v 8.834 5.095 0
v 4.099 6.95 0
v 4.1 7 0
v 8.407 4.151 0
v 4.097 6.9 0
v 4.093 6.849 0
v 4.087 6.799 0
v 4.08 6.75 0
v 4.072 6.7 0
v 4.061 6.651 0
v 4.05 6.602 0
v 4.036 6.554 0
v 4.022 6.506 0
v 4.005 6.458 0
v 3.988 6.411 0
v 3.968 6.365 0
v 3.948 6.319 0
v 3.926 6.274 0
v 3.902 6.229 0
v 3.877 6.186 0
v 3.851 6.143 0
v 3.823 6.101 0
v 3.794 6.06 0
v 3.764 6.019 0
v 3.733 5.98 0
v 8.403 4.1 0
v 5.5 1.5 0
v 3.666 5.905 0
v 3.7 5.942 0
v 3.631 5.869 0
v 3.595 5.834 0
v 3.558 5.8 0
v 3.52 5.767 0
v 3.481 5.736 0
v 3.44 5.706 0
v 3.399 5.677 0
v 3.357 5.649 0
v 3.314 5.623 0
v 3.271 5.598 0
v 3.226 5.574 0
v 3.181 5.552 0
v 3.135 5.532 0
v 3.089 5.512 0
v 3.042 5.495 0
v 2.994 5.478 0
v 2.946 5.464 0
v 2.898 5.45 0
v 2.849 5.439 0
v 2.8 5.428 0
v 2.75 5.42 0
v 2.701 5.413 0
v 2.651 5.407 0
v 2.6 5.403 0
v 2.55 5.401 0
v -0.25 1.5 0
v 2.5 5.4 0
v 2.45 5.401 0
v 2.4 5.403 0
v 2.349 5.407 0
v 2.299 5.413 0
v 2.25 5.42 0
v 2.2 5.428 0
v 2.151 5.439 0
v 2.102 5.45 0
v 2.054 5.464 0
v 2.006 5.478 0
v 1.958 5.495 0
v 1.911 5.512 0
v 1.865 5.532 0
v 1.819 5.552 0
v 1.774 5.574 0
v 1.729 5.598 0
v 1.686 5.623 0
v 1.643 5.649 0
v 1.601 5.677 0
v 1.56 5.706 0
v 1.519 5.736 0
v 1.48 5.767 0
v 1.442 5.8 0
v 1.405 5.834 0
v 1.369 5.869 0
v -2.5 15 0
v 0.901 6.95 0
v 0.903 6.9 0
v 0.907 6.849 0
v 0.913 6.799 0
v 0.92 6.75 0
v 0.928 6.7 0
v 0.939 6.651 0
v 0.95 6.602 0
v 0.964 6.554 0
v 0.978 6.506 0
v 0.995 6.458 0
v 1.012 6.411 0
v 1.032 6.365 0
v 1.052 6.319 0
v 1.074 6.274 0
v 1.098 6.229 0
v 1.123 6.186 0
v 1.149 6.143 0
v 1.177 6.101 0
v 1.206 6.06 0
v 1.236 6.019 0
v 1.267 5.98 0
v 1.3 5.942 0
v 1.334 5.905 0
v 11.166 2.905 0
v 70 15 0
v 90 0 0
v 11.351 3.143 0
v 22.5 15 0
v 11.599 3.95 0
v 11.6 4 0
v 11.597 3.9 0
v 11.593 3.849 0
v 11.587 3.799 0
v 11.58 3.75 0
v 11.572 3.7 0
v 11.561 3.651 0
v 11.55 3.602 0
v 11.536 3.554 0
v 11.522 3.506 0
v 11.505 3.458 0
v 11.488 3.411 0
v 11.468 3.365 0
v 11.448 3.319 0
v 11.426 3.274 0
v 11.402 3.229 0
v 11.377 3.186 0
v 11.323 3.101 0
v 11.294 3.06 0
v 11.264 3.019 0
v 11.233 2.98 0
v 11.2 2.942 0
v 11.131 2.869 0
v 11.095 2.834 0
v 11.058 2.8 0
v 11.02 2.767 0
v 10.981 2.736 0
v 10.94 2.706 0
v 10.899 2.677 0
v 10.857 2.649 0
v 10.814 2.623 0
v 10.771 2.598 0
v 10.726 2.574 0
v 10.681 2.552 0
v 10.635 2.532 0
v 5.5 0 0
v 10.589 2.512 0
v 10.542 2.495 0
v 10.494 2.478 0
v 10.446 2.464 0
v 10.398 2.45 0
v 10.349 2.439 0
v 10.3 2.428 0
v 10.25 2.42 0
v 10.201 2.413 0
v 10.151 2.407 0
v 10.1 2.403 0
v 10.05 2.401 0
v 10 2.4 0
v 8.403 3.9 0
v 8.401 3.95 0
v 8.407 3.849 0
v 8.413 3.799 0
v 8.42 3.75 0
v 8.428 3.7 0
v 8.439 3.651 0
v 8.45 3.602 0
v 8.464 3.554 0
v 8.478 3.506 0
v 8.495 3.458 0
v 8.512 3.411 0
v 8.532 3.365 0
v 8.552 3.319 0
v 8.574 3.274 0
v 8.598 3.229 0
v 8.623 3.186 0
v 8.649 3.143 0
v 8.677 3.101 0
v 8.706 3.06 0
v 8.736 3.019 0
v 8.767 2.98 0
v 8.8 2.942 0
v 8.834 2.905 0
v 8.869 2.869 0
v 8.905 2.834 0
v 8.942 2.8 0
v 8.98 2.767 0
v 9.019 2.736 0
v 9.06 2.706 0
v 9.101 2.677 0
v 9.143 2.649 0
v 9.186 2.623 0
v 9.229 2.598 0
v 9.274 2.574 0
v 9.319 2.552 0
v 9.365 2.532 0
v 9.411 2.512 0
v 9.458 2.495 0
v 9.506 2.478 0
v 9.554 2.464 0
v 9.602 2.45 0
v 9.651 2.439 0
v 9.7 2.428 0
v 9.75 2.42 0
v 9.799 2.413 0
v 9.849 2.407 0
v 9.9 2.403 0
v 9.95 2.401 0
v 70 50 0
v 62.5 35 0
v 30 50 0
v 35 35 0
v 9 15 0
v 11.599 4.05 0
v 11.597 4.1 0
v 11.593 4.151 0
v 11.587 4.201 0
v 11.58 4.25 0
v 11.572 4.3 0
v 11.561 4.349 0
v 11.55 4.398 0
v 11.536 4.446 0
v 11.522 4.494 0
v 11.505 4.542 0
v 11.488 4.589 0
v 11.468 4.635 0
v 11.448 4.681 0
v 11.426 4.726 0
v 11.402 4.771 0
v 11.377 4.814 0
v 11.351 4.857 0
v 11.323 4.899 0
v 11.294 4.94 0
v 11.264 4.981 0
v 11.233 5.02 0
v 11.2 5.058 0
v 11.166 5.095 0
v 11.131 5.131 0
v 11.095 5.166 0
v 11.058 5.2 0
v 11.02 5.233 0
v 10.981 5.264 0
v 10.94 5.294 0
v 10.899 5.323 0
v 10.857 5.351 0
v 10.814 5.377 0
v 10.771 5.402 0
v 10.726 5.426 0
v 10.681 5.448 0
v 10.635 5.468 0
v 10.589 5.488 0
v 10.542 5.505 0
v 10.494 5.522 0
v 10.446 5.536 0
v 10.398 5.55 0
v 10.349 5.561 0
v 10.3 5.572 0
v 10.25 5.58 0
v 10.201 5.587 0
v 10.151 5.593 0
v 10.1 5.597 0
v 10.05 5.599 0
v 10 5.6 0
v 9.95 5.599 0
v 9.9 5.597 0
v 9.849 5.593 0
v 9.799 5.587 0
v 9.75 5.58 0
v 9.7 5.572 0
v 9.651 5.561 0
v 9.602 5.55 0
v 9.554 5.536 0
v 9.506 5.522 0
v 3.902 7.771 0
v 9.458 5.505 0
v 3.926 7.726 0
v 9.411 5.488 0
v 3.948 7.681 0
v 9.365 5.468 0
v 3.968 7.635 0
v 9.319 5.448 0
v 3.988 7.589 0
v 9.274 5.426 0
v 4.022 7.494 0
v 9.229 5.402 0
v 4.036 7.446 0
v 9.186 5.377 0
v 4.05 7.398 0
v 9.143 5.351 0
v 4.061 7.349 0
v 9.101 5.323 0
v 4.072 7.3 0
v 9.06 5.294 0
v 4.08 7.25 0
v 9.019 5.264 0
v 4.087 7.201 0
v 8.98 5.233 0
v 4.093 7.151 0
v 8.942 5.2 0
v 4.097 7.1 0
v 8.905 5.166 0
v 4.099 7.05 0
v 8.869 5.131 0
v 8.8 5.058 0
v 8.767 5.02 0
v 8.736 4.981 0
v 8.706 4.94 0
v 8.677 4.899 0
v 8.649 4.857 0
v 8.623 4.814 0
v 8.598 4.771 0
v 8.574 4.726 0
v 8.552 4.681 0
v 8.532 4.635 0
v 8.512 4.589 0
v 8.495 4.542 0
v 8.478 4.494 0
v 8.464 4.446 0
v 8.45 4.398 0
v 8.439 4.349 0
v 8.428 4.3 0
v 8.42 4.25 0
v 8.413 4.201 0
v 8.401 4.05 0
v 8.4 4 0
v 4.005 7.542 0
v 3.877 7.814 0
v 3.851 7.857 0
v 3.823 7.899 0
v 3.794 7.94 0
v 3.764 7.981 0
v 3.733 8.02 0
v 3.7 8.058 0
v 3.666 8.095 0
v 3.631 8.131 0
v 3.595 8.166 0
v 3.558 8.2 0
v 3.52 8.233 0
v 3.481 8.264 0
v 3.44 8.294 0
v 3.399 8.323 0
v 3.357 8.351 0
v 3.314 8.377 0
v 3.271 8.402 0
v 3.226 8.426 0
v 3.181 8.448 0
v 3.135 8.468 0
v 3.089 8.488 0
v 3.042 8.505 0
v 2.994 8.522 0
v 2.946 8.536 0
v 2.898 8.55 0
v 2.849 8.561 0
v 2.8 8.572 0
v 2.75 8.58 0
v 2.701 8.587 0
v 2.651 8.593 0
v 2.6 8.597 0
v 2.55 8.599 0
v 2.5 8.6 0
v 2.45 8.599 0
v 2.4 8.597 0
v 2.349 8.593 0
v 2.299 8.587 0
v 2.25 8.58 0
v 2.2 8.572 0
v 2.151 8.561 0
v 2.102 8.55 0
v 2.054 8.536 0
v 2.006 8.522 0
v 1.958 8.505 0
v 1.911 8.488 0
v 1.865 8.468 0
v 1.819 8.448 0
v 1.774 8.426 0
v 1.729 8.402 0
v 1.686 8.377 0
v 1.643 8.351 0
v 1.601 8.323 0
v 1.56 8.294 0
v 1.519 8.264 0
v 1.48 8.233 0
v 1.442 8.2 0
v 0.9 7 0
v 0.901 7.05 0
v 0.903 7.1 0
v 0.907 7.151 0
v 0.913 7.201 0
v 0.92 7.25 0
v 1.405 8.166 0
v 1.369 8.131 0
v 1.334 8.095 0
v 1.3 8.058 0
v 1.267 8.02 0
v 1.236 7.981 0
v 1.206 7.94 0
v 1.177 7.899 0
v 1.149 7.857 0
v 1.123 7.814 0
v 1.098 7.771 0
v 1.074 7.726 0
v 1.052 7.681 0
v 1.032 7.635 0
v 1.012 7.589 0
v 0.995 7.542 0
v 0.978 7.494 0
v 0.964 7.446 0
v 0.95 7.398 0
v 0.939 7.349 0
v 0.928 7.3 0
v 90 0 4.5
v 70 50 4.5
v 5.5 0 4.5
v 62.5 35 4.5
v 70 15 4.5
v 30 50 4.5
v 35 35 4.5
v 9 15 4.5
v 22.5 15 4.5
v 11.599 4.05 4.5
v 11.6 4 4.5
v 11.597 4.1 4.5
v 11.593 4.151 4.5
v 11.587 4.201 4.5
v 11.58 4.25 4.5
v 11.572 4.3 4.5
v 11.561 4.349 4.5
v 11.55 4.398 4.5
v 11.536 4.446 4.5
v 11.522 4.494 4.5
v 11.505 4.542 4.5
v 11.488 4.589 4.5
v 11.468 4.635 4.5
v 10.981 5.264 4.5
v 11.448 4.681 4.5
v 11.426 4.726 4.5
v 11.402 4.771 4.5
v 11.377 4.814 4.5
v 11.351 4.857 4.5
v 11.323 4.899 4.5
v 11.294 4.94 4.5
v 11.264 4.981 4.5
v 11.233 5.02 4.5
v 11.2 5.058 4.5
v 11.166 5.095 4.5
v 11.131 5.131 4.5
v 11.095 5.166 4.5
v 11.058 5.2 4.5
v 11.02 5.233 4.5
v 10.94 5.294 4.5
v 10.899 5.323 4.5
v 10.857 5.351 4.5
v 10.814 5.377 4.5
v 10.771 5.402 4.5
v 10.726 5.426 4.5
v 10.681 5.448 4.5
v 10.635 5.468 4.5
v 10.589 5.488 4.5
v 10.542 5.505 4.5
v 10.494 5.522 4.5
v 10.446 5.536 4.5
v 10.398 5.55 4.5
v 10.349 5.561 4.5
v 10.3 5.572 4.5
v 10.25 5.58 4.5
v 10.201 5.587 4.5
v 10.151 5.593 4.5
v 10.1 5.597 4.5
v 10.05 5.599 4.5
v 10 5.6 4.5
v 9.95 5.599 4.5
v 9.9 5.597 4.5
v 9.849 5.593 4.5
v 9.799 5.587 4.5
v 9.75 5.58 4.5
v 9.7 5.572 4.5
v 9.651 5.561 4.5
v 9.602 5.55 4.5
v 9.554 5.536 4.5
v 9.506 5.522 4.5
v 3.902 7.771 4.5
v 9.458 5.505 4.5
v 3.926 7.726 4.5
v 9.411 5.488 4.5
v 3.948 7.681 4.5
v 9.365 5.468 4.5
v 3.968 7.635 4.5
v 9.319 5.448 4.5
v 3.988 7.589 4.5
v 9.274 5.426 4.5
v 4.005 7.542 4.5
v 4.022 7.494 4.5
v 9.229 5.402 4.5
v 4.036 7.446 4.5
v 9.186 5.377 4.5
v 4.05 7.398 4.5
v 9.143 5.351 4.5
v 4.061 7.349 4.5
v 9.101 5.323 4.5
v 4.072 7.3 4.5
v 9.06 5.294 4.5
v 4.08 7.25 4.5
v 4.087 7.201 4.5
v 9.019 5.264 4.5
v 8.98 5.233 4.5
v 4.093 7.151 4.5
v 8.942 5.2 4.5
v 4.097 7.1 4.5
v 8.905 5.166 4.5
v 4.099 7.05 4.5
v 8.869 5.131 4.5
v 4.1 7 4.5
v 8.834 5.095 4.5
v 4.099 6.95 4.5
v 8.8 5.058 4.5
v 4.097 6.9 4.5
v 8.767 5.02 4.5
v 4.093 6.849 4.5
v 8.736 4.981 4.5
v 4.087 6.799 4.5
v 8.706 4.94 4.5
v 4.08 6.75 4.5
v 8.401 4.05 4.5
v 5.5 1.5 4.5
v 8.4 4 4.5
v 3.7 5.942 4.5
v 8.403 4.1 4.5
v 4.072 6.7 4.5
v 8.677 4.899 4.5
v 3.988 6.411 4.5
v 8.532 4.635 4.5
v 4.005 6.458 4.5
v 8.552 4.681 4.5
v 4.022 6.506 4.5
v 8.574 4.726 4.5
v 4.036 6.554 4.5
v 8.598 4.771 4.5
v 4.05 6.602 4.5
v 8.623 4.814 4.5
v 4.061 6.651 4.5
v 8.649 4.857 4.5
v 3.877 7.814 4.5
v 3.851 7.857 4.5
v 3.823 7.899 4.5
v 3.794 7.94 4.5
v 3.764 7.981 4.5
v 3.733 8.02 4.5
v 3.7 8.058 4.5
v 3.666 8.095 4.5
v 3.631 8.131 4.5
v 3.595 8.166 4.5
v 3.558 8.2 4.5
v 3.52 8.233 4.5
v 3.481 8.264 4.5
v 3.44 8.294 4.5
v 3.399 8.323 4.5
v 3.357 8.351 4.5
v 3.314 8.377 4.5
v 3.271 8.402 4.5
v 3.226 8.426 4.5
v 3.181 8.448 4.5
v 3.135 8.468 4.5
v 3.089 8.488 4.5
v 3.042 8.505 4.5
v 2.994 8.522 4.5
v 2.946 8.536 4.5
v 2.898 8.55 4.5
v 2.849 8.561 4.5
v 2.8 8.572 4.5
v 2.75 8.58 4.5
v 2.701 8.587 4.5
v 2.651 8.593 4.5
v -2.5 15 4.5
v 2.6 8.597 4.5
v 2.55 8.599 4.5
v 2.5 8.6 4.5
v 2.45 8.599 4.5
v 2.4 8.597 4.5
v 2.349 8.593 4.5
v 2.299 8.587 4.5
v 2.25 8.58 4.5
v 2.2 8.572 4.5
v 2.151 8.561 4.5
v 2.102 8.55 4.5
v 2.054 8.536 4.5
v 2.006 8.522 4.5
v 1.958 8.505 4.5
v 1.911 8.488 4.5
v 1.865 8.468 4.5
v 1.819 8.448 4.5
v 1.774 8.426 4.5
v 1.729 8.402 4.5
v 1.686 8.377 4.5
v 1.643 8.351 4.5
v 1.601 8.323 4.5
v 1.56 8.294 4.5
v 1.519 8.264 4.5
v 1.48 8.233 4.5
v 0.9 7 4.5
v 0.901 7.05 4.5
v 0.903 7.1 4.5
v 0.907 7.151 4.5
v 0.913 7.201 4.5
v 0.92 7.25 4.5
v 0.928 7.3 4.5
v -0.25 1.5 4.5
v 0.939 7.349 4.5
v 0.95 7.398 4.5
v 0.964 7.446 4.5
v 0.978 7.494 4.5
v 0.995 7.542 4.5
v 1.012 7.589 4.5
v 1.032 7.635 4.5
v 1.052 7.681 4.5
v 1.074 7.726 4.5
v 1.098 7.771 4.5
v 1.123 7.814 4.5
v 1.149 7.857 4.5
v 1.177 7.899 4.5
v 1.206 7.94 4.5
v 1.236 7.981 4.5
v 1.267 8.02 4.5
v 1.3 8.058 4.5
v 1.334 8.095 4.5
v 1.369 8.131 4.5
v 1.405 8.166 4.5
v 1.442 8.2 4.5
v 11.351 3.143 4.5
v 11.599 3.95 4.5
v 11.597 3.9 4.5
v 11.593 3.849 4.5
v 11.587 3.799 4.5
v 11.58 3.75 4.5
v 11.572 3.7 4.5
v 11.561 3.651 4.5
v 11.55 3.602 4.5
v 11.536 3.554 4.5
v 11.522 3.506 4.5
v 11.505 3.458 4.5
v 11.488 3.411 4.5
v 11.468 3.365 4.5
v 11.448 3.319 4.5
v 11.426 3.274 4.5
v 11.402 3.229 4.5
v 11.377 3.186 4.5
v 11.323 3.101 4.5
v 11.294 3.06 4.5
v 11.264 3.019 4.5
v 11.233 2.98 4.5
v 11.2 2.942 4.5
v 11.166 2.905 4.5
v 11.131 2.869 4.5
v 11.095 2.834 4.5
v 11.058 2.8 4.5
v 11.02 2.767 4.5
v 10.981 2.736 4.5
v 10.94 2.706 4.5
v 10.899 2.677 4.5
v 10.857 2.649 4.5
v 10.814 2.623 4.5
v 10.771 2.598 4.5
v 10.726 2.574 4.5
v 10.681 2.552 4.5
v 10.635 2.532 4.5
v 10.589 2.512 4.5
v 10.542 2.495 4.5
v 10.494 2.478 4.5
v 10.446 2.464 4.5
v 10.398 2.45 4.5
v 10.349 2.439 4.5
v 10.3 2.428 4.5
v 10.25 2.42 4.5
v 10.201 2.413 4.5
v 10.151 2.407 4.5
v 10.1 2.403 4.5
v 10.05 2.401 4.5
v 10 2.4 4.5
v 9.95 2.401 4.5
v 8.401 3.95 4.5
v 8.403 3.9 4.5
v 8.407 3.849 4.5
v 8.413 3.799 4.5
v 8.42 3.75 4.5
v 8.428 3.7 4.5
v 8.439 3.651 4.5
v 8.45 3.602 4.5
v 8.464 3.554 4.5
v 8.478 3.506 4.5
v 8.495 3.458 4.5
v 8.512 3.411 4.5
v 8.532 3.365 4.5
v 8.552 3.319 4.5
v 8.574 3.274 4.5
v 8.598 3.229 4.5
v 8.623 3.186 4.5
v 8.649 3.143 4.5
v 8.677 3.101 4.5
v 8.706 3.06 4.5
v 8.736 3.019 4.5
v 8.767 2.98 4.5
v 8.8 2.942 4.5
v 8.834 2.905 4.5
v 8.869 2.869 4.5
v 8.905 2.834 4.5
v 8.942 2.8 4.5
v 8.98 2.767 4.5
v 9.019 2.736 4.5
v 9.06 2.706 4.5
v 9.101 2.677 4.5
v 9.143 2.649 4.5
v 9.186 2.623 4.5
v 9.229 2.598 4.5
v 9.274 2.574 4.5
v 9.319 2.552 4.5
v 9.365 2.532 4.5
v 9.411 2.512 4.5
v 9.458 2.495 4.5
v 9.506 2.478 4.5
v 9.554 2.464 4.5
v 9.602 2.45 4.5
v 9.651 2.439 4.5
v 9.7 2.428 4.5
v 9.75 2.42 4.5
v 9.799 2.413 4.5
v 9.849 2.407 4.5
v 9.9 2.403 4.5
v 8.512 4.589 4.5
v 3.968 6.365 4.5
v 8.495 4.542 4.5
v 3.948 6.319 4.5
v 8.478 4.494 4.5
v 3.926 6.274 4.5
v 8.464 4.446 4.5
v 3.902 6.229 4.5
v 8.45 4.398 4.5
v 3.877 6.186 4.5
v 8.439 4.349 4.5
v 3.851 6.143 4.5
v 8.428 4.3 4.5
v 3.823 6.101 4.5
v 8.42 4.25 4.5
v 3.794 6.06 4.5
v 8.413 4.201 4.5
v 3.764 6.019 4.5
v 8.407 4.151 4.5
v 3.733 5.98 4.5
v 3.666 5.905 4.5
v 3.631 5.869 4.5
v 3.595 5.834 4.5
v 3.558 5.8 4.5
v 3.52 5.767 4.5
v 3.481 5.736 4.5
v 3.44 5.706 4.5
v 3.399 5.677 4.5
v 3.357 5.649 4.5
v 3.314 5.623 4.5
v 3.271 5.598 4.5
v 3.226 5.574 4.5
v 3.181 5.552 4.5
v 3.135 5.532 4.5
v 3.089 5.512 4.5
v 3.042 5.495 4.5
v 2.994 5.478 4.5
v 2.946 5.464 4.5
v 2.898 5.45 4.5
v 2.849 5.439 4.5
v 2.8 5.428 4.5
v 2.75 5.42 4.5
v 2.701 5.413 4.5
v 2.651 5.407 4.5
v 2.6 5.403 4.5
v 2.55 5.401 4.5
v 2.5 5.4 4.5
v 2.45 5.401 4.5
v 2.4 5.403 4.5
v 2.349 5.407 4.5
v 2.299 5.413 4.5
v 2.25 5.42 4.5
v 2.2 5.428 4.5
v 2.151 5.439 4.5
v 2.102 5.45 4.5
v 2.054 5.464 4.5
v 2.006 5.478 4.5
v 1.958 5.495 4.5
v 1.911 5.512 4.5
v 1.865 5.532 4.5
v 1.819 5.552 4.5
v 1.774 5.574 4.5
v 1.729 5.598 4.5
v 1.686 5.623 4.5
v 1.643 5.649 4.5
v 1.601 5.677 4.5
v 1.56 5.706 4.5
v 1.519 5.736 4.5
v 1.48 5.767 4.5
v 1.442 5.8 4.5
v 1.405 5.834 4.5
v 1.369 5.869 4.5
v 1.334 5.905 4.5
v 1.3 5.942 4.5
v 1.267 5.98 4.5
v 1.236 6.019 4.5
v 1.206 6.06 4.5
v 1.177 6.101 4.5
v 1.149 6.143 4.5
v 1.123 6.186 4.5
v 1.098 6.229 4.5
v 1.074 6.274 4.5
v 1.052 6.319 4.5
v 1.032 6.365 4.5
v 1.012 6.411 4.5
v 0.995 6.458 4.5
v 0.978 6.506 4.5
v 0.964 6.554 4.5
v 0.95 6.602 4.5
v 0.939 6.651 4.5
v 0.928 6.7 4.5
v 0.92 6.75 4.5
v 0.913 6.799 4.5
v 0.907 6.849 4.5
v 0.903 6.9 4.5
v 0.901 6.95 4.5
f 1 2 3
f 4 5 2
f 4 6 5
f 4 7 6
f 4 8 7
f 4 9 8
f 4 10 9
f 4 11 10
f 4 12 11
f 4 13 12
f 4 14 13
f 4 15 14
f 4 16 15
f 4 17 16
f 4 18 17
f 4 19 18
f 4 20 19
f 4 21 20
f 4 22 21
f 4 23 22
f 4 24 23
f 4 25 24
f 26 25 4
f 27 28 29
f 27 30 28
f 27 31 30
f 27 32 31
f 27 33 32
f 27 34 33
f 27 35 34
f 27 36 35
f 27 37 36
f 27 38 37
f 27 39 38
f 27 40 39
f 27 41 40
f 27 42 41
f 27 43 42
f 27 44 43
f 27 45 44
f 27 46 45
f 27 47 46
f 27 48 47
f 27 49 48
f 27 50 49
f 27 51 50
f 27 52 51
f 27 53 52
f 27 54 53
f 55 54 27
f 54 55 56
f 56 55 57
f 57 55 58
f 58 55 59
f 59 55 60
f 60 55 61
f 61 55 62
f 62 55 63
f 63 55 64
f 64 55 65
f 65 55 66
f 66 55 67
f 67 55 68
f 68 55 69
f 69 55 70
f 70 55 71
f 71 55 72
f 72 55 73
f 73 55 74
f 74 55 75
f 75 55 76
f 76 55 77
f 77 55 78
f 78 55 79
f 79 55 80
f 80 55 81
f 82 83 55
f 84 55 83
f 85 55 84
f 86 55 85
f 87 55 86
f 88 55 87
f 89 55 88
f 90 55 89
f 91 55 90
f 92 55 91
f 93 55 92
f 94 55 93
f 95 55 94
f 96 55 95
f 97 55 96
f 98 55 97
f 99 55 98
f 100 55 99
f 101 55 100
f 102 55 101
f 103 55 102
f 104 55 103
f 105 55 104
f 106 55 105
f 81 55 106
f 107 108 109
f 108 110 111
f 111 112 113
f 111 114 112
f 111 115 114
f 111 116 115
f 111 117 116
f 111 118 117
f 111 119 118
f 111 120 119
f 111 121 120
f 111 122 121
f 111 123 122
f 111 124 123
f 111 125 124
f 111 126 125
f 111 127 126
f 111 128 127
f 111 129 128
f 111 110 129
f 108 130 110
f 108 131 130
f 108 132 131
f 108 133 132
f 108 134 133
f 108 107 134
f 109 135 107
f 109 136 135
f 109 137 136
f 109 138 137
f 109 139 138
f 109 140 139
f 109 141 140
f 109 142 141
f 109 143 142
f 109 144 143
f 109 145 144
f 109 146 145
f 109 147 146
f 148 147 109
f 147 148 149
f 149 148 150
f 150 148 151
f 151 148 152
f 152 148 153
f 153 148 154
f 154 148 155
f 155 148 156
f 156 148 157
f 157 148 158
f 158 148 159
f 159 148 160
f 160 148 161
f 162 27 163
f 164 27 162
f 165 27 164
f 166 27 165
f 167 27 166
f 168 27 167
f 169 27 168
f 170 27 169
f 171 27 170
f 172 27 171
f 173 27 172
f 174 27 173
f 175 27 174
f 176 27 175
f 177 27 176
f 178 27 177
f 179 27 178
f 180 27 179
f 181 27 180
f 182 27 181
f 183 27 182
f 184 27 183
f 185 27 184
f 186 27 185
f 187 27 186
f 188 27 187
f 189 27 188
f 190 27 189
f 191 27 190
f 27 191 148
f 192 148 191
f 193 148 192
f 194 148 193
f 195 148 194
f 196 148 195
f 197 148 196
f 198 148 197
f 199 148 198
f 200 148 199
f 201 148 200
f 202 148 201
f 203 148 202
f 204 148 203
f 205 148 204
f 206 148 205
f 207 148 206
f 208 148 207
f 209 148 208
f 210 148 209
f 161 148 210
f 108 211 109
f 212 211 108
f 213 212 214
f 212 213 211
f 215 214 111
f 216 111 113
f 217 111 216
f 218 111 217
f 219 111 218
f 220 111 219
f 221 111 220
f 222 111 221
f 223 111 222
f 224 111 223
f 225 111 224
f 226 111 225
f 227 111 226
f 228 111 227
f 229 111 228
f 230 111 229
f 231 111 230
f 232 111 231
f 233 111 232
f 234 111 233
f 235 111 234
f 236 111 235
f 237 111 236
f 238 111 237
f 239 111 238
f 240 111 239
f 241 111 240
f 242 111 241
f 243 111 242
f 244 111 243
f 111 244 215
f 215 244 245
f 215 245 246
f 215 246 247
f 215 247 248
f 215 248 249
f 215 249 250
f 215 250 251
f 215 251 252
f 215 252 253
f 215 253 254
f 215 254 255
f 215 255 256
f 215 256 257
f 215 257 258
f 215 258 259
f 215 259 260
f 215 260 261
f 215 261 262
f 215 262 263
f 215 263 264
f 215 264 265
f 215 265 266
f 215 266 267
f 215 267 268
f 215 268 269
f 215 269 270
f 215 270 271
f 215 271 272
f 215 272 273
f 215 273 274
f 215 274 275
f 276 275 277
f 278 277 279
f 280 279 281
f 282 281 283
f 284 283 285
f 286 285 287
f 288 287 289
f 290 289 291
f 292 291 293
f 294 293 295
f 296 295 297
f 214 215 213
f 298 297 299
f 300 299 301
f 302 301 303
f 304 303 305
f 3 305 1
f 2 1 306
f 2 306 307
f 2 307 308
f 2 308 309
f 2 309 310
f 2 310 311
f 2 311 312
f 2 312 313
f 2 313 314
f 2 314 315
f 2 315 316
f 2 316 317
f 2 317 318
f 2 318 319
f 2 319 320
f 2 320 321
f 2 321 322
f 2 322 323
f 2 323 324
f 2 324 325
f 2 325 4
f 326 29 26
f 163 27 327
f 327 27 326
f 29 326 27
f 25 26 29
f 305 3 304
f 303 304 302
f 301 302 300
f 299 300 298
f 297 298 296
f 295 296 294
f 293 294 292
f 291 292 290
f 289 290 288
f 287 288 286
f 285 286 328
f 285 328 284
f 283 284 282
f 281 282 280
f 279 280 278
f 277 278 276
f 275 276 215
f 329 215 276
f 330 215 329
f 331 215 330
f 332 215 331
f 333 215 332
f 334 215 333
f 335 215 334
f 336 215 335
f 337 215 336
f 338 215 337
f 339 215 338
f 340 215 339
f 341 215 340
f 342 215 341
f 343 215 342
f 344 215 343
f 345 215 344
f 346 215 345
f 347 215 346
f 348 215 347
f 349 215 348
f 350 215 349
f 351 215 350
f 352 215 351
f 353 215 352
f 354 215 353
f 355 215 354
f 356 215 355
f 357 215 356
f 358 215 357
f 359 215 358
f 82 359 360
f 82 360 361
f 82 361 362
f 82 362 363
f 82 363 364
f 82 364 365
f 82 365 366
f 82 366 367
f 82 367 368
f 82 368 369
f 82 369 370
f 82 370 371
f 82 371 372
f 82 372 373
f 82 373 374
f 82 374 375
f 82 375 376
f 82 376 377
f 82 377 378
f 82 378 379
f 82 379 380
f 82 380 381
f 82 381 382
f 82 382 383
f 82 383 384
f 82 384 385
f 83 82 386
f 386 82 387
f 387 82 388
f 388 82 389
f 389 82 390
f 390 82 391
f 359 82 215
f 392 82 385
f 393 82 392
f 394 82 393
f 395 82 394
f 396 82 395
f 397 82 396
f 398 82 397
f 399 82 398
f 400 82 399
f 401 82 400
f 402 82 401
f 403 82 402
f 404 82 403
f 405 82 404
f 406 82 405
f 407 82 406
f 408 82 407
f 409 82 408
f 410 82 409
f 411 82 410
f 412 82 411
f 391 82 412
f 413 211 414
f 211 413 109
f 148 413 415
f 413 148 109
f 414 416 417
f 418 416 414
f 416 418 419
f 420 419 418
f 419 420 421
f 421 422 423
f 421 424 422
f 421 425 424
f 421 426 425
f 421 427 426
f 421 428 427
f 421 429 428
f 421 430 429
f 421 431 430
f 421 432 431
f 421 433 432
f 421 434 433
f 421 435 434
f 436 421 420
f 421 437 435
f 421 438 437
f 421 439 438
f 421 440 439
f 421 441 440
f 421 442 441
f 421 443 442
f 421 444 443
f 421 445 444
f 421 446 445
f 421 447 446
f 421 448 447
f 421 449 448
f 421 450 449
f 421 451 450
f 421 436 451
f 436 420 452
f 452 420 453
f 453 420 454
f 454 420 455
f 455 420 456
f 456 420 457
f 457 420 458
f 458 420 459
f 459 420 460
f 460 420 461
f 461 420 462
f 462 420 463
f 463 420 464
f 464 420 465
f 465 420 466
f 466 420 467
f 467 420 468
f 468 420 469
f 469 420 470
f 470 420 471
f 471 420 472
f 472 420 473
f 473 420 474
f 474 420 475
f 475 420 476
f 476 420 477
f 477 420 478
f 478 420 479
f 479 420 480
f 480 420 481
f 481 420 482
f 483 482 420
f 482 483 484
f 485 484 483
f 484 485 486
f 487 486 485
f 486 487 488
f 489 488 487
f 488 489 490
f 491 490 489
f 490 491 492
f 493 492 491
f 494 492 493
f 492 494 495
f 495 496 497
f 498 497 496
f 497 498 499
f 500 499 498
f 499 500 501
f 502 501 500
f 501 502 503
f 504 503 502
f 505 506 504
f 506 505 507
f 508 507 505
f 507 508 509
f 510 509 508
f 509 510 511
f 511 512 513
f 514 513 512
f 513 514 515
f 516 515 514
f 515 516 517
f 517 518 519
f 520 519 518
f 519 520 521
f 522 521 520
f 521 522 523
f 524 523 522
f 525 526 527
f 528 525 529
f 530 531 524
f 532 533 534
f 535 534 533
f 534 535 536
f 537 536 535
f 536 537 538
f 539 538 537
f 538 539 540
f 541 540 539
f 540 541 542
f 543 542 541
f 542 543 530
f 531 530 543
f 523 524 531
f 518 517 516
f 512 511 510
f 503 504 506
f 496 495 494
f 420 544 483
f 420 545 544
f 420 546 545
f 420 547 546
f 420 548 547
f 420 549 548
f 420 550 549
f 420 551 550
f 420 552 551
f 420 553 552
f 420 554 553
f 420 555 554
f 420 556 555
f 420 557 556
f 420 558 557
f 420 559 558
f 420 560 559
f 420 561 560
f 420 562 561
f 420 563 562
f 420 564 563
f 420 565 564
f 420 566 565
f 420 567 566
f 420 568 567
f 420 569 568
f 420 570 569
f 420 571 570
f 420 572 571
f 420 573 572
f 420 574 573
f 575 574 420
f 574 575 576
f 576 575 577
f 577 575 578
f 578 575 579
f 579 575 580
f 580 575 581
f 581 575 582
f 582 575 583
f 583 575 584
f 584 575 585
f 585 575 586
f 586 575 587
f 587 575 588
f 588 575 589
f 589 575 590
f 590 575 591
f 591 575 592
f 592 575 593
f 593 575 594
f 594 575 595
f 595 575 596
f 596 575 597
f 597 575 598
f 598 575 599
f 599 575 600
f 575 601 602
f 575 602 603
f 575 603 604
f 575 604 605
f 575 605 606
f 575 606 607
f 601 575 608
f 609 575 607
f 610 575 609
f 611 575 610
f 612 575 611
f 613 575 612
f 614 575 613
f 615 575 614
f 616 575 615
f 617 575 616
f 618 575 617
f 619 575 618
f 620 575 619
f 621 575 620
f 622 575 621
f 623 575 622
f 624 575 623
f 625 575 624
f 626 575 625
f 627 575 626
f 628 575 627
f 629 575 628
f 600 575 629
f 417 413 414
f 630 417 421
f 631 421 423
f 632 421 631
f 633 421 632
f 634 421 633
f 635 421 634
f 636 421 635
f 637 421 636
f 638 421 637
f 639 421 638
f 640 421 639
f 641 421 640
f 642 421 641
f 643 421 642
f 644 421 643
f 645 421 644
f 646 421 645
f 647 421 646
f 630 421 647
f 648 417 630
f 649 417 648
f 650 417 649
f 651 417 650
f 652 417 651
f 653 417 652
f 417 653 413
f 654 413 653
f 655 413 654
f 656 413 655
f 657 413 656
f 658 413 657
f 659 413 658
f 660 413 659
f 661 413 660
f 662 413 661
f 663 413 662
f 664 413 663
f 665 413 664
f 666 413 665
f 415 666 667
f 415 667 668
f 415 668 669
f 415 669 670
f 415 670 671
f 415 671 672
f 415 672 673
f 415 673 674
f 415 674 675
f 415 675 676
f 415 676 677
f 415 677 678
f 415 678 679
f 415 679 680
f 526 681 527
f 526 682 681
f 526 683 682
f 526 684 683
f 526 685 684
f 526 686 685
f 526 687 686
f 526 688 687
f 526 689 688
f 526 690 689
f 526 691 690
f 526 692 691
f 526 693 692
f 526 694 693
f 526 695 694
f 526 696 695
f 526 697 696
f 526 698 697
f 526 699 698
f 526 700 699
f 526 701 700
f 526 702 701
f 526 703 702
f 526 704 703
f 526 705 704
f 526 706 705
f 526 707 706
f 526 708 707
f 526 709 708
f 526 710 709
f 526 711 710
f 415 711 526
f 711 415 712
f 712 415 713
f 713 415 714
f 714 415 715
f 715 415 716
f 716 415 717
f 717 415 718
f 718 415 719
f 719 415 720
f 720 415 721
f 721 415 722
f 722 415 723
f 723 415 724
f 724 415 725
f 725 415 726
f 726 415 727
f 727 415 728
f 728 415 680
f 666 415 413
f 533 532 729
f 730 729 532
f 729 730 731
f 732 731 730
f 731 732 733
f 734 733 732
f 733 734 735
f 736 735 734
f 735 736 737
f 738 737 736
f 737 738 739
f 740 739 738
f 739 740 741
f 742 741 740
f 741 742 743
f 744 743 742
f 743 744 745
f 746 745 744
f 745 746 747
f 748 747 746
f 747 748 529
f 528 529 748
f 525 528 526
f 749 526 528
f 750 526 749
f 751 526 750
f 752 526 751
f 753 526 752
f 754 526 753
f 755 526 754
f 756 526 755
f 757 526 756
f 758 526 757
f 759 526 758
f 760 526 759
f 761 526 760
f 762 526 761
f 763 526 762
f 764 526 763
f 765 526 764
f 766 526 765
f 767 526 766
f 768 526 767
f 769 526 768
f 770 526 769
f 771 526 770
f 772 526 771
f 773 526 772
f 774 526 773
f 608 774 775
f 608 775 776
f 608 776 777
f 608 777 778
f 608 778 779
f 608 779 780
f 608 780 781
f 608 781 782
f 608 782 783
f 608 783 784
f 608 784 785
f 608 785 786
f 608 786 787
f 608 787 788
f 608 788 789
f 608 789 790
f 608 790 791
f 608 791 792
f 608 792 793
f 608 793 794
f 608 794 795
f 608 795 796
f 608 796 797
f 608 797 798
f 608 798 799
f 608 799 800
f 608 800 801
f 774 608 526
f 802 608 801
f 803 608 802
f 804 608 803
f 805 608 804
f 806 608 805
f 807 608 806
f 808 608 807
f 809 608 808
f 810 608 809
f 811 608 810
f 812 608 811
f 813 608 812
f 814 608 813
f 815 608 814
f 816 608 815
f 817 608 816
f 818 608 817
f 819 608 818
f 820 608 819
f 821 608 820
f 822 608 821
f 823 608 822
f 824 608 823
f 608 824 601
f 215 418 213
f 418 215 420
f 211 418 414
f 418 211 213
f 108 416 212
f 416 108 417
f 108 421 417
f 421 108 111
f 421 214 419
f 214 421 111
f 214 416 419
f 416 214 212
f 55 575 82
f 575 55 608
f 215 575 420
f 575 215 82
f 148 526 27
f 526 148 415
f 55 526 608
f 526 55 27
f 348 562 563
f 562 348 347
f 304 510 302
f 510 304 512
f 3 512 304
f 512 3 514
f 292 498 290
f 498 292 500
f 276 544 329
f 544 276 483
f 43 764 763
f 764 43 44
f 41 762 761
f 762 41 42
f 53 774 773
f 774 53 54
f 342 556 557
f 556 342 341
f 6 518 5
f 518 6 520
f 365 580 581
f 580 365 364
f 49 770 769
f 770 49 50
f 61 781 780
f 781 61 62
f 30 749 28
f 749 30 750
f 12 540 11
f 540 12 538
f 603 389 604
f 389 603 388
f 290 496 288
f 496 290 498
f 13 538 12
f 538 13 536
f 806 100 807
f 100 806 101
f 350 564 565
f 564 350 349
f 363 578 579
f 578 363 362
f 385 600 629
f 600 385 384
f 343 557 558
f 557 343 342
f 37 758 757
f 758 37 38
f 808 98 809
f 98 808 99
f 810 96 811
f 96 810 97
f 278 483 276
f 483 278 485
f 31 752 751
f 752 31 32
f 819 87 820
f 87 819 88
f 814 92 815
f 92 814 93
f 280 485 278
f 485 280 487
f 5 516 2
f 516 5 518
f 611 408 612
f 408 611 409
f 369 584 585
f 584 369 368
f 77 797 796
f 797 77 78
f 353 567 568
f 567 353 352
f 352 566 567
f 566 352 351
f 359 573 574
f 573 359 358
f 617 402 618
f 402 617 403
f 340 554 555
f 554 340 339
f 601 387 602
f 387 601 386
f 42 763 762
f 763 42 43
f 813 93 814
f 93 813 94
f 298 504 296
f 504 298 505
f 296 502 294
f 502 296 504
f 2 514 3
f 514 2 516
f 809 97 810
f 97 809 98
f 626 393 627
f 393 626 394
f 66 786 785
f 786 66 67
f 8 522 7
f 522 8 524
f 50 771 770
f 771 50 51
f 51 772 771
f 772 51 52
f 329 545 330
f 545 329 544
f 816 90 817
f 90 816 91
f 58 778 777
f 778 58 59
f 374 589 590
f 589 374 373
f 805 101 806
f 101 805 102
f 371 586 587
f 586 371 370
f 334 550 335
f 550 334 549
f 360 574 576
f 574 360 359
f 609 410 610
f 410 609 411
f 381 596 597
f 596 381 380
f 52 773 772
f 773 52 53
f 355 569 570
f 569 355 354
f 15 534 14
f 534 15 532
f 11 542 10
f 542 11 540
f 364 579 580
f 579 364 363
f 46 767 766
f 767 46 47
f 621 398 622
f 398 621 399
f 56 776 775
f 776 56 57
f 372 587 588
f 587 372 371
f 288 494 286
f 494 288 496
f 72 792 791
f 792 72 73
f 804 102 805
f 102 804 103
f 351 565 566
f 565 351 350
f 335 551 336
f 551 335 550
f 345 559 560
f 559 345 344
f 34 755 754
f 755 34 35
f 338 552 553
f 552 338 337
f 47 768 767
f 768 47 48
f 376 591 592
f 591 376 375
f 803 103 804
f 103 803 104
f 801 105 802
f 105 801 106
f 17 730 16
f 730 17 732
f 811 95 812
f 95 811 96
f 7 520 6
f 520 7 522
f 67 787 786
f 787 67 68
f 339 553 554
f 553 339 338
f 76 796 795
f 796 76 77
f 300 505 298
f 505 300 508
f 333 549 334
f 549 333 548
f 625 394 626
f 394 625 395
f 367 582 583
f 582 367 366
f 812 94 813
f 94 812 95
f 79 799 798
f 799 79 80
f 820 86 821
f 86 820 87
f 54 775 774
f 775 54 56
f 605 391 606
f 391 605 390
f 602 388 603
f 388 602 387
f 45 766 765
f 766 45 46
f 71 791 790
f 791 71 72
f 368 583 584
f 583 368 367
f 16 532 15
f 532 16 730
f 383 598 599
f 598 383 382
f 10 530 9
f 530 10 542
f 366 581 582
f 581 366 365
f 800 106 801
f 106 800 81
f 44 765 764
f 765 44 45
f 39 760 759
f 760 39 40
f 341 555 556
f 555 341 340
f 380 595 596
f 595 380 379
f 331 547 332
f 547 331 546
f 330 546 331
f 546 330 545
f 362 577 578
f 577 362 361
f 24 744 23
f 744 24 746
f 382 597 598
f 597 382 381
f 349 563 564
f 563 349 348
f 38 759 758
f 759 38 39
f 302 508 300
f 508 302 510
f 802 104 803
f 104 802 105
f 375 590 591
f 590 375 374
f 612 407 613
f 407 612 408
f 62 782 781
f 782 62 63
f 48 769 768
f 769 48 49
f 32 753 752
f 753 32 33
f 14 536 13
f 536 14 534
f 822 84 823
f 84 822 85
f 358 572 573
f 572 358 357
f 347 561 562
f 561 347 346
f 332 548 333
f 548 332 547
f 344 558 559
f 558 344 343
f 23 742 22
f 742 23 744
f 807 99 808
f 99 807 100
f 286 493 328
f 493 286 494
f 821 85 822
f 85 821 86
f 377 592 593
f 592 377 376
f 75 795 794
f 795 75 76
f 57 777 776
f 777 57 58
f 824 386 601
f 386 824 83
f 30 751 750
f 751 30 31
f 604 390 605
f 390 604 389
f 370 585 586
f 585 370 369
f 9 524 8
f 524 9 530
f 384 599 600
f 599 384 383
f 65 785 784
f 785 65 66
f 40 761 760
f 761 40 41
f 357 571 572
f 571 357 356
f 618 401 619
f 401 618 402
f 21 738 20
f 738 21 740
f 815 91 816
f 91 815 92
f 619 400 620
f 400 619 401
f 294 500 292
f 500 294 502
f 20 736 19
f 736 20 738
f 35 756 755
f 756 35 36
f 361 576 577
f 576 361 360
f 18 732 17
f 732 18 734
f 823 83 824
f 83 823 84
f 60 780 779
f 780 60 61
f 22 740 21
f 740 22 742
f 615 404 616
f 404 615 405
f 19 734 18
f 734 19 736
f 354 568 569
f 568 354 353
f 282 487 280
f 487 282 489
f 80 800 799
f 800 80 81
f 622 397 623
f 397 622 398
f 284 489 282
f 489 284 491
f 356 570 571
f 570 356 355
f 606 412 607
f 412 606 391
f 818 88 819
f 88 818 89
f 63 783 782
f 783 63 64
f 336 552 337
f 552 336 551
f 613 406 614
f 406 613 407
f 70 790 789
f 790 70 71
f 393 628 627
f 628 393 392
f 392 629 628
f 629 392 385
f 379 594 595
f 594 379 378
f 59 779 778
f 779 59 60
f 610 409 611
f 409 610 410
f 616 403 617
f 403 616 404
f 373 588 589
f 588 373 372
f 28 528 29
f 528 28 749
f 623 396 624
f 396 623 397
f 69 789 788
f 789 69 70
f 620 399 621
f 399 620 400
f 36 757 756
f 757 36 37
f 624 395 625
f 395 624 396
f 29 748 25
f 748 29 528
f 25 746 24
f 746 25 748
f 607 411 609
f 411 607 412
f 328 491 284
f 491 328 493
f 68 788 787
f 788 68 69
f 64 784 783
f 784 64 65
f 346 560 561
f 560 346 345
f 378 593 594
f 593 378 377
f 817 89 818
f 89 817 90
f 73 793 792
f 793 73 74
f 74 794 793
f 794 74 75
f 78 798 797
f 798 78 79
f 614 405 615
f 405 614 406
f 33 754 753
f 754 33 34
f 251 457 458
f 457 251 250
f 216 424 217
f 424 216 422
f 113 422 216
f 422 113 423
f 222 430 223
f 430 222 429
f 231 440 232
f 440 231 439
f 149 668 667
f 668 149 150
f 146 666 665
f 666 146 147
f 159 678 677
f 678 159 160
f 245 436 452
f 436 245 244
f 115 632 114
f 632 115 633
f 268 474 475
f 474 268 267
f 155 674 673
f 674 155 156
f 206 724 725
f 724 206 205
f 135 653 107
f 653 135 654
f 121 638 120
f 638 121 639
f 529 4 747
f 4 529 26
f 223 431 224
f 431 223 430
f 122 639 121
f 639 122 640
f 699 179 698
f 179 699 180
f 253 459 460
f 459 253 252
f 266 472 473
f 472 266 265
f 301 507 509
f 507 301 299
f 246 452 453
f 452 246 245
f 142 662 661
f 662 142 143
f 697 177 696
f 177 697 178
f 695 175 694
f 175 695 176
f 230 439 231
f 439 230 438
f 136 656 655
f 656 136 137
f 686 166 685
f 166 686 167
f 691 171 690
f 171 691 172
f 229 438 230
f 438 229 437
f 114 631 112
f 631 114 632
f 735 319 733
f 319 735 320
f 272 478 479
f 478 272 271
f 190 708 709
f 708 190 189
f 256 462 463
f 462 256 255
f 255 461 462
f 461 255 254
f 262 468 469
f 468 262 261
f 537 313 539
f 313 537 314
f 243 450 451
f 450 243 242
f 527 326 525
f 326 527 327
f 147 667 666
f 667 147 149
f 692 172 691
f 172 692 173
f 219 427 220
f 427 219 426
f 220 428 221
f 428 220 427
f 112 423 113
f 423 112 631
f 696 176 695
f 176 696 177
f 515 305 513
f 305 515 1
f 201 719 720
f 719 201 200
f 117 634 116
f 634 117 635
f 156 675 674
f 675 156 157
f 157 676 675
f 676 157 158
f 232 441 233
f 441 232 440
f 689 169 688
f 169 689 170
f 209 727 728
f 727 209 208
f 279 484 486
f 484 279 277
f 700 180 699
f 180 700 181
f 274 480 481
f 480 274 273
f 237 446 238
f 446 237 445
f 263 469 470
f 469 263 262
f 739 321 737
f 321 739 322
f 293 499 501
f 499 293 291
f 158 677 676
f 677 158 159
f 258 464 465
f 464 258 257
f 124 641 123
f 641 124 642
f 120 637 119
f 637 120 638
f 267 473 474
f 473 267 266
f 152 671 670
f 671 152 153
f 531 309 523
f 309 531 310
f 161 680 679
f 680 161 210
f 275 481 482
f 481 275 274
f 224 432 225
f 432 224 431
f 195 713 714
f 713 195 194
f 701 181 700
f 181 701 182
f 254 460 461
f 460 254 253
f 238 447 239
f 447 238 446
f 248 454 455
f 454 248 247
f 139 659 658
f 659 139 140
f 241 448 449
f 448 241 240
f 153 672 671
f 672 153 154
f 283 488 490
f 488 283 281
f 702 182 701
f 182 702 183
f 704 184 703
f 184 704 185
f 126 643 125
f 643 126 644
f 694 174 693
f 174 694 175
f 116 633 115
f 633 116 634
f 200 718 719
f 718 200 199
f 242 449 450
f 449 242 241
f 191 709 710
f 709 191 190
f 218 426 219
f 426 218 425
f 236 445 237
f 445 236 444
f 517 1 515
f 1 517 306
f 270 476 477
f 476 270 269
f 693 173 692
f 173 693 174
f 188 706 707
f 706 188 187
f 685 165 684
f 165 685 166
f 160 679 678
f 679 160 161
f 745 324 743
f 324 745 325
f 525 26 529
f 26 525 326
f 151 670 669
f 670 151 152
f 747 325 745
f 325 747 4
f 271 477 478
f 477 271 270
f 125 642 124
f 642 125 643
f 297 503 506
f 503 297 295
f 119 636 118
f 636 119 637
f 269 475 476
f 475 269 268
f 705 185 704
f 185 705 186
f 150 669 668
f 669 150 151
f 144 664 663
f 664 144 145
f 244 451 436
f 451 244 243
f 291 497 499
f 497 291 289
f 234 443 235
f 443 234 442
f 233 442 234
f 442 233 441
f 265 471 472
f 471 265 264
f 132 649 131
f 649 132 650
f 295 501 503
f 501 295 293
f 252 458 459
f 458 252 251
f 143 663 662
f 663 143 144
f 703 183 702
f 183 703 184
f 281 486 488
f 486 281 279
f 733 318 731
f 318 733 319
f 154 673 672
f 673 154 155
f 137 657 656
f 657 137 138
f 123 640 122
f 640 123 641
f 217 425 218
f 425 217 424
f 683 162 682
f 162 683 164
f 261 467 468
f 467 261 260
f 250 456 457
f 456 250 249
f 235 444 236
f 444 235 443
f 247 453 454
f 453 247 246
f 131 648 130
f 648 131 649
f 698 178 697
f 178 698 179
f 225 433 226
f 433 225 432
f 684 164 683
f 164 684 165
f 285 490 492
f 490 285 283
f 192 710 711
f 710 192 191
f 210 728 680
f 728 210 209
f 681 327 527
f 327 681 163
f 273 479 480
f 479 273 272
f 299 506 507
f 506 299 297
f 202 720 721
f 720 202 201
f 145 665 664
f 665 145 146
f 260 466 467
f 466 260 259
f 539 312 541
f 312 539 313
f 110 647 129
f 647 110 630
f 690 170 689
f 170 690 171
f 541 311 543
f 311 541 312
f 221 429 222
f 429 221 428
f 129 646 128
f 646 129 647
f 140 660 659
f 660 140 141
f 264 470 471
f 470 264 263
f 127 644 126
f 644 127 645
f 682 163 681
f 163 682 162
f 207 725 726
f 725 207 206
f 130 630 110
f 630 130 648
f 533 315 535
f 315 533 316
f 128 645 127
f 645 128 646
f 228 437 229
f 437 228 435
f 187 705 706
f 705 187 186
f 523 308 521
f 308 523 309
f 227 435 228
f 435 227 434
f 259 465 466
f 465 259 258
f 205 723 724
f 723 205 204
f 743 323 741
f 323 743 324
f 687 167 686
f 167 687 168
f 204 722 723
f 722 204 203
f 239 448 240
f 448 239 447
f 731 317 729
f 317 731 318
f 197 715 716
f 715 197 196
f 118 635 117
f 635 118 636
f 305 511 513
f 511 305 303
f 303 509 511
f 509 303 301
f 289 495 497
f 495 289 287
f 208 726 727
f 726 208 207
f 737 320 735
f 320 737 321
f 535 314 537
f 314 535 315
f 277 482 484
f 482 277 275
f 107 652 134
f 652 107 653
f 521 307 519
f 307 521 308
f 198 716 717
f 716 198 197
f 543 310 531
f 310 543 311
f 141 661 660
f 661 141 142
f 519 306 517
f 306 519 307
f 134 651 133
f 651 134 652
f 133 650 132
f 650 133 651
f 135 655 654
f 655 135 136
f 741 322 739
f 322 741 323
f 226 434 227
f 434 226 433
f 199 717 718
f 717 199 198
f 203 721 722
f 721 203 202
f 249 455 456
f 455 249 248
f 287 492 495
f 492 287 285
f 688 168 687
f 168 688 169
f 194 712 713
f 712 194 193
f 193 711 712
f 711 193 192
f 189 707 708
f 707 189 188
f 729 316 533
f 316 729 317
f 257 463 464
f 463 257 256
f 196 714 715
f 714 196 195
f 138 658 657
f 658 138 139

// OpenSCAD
l = 20; w = 2.5; h = 0.1; 


a=[[0,0],[90,0],[70,50],[30,50]]; 
b=[[22.5,15],[70,15],[62.5,35],[35,35]]; 
c=[[0,0],[10,0],[15,15],[-2.5,15]]; 

difference(){    
    union(){
        difference() {
            linear_extrude(4.5) polygon(a);
            translate([0,0,-0.1]){
                linear_extrude(6) polygon(b);
            }
        }
        linear_extrude(4.5) polygon(c);
    }
    translate([-1,-0.1,-0.1]){cube([6.5,1.6,4.7]){}}
    translate([2.5,7,-0.1]){cylinder(r=1.6, h=5, $fn=200);}
    translate([10,4,-0.1]){cylinder(r=1.6, h=5, $fn=200);}

}
